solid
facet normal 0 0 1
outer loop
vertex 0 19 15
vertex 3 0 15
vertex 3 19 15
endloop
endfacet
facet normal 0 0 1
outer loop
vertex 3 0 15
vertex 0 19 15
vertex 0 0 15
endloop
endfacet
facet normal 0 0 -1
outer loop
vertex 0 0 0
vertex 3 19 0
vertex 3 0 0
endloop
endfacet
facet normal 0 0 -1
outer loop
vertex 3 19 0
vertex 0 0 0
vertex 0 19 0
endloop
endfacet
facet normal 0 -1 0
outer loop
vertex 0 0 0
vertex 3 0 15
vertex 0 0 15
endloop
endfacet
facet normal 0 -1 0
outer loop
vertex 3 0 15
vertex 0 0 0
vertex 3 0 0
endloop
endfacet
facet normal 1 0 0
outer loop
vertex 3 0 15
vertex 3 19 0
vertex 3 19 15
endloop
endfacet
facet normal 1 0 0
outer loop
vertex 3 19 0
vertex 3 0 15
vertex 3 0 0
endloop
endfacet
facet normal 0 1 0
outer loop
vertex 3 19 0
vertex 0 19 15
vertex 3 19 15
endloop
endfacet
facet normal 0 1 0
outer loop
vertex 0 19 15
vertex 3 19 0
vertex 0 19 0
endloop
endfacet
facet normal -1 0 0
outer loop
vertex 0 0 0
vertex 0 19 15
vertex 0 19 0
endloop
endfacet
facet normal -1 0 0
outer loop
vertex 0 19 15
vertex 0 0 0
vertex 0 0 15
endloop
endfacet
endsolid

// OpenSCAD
// Generated by SolidPython 1.0.1 on 2020-07-29 00:46:54


cube(size = [3, 19, 15]);
/***********************************************
*********      SolidPython code:      **********
************************************************
 
# import packages: SolidPython
from solid import *
from solid.utils import *
from itertools import chain, combinations, permutations


class Resize:

    def __init__(self, scad_file):
        self.scad_file = scad_file
        #self.scad_file = import_scad(scad_file)
        # cone/cylinder param:
        self.r1 = 0
        self.r2 = 0
        self.h = 0
        # rectangular prism param:
        self.w = 0
        self.l = 0
        # ellipse param:
        self.r = 0

    # import OpenScad code (file name corresponds to shape)


    # classify shape + parameters
    def assign(self, param1, param2, param3):
        if self.scad_file == 'cone.scad':
            self.r1 = param1
            self.r2 = param2
            self.h = param3
        elif self.scad_file == 'cylinder.scad':
            self.r1 = param1
            self.r2 = param2
            self.h = param3
        elif self.scad_file == 'rectangularPrism.scad':
            self.h = param1
            self.l = param2
            self.w = param3
        else:
            self.r = param1
            self.h = param2

    # resize parameters
    def iterate(self):
        x = range(3, 20, 2)
        i = 1
        if self.scad_file == 'cone.scad':
            tempList = list(permutations(x, 2))
            for temp in tempList:
                param1 = temp[0]
                param2 = temp[1]
                filepath = 'produced_scad_files/' + 'cone' + str(param1) + '_' + str(param2) + '_' + '.scad'
                scad_render_to_file(cylinder(h=param1, r1=param2, r2=0), filepath)

        elif self.scad_file == 'cylinder.scad':
            tempList = list(permutations(x, 3))
            for temp in tempList:
                param1 = temp[0]
                param2 = temp[1]
                filepath = 'produced_scad_files/' + 'cylinder' + str(param1) + '_' + str(param2) + '_' + '.scad'
                scad_render_to_file(cylinder(h=param1, r1=param2, r2=param2), filepath)

        elif self.scad_file == 'rectangularPrism.scad':
            tempList = list(permutations(x, 3))
            for temp in tempList:
                param1 = temp[0]
                param2 = temp[1]
                param3 = temp[2]
                filepath = 'produced_scad_files/' + 'rectangularPrism' + str(param1) + '_' + str(param2) + '_' + str(
                    param3) + '.scad'
                scad_render_to_file(cube(size=(param1, param2, param3)), filepath)

        elif self.scad_file == 'ellipse.scad':
            tempList = list(permutations(x, 4))
            for temp in tempList:
                param1 = temp[0]
                param2 = temp[1]
                param3 = temp[2]
                param4 = temp[3]
                filepath = 'produced_scad_files/' + 'ellipse' + str(param1) + '_' + str(param2) + '_' + str(param3) + '_' + str(param4) + '.scad'
                scad_render_to_file(scale([param1, param2, param3])(sphere(r=param4)), filepath)

    def render_to_scadfile(self):
        scad_render_to_file(scad, 'example.scad') 
 
************************************************/
